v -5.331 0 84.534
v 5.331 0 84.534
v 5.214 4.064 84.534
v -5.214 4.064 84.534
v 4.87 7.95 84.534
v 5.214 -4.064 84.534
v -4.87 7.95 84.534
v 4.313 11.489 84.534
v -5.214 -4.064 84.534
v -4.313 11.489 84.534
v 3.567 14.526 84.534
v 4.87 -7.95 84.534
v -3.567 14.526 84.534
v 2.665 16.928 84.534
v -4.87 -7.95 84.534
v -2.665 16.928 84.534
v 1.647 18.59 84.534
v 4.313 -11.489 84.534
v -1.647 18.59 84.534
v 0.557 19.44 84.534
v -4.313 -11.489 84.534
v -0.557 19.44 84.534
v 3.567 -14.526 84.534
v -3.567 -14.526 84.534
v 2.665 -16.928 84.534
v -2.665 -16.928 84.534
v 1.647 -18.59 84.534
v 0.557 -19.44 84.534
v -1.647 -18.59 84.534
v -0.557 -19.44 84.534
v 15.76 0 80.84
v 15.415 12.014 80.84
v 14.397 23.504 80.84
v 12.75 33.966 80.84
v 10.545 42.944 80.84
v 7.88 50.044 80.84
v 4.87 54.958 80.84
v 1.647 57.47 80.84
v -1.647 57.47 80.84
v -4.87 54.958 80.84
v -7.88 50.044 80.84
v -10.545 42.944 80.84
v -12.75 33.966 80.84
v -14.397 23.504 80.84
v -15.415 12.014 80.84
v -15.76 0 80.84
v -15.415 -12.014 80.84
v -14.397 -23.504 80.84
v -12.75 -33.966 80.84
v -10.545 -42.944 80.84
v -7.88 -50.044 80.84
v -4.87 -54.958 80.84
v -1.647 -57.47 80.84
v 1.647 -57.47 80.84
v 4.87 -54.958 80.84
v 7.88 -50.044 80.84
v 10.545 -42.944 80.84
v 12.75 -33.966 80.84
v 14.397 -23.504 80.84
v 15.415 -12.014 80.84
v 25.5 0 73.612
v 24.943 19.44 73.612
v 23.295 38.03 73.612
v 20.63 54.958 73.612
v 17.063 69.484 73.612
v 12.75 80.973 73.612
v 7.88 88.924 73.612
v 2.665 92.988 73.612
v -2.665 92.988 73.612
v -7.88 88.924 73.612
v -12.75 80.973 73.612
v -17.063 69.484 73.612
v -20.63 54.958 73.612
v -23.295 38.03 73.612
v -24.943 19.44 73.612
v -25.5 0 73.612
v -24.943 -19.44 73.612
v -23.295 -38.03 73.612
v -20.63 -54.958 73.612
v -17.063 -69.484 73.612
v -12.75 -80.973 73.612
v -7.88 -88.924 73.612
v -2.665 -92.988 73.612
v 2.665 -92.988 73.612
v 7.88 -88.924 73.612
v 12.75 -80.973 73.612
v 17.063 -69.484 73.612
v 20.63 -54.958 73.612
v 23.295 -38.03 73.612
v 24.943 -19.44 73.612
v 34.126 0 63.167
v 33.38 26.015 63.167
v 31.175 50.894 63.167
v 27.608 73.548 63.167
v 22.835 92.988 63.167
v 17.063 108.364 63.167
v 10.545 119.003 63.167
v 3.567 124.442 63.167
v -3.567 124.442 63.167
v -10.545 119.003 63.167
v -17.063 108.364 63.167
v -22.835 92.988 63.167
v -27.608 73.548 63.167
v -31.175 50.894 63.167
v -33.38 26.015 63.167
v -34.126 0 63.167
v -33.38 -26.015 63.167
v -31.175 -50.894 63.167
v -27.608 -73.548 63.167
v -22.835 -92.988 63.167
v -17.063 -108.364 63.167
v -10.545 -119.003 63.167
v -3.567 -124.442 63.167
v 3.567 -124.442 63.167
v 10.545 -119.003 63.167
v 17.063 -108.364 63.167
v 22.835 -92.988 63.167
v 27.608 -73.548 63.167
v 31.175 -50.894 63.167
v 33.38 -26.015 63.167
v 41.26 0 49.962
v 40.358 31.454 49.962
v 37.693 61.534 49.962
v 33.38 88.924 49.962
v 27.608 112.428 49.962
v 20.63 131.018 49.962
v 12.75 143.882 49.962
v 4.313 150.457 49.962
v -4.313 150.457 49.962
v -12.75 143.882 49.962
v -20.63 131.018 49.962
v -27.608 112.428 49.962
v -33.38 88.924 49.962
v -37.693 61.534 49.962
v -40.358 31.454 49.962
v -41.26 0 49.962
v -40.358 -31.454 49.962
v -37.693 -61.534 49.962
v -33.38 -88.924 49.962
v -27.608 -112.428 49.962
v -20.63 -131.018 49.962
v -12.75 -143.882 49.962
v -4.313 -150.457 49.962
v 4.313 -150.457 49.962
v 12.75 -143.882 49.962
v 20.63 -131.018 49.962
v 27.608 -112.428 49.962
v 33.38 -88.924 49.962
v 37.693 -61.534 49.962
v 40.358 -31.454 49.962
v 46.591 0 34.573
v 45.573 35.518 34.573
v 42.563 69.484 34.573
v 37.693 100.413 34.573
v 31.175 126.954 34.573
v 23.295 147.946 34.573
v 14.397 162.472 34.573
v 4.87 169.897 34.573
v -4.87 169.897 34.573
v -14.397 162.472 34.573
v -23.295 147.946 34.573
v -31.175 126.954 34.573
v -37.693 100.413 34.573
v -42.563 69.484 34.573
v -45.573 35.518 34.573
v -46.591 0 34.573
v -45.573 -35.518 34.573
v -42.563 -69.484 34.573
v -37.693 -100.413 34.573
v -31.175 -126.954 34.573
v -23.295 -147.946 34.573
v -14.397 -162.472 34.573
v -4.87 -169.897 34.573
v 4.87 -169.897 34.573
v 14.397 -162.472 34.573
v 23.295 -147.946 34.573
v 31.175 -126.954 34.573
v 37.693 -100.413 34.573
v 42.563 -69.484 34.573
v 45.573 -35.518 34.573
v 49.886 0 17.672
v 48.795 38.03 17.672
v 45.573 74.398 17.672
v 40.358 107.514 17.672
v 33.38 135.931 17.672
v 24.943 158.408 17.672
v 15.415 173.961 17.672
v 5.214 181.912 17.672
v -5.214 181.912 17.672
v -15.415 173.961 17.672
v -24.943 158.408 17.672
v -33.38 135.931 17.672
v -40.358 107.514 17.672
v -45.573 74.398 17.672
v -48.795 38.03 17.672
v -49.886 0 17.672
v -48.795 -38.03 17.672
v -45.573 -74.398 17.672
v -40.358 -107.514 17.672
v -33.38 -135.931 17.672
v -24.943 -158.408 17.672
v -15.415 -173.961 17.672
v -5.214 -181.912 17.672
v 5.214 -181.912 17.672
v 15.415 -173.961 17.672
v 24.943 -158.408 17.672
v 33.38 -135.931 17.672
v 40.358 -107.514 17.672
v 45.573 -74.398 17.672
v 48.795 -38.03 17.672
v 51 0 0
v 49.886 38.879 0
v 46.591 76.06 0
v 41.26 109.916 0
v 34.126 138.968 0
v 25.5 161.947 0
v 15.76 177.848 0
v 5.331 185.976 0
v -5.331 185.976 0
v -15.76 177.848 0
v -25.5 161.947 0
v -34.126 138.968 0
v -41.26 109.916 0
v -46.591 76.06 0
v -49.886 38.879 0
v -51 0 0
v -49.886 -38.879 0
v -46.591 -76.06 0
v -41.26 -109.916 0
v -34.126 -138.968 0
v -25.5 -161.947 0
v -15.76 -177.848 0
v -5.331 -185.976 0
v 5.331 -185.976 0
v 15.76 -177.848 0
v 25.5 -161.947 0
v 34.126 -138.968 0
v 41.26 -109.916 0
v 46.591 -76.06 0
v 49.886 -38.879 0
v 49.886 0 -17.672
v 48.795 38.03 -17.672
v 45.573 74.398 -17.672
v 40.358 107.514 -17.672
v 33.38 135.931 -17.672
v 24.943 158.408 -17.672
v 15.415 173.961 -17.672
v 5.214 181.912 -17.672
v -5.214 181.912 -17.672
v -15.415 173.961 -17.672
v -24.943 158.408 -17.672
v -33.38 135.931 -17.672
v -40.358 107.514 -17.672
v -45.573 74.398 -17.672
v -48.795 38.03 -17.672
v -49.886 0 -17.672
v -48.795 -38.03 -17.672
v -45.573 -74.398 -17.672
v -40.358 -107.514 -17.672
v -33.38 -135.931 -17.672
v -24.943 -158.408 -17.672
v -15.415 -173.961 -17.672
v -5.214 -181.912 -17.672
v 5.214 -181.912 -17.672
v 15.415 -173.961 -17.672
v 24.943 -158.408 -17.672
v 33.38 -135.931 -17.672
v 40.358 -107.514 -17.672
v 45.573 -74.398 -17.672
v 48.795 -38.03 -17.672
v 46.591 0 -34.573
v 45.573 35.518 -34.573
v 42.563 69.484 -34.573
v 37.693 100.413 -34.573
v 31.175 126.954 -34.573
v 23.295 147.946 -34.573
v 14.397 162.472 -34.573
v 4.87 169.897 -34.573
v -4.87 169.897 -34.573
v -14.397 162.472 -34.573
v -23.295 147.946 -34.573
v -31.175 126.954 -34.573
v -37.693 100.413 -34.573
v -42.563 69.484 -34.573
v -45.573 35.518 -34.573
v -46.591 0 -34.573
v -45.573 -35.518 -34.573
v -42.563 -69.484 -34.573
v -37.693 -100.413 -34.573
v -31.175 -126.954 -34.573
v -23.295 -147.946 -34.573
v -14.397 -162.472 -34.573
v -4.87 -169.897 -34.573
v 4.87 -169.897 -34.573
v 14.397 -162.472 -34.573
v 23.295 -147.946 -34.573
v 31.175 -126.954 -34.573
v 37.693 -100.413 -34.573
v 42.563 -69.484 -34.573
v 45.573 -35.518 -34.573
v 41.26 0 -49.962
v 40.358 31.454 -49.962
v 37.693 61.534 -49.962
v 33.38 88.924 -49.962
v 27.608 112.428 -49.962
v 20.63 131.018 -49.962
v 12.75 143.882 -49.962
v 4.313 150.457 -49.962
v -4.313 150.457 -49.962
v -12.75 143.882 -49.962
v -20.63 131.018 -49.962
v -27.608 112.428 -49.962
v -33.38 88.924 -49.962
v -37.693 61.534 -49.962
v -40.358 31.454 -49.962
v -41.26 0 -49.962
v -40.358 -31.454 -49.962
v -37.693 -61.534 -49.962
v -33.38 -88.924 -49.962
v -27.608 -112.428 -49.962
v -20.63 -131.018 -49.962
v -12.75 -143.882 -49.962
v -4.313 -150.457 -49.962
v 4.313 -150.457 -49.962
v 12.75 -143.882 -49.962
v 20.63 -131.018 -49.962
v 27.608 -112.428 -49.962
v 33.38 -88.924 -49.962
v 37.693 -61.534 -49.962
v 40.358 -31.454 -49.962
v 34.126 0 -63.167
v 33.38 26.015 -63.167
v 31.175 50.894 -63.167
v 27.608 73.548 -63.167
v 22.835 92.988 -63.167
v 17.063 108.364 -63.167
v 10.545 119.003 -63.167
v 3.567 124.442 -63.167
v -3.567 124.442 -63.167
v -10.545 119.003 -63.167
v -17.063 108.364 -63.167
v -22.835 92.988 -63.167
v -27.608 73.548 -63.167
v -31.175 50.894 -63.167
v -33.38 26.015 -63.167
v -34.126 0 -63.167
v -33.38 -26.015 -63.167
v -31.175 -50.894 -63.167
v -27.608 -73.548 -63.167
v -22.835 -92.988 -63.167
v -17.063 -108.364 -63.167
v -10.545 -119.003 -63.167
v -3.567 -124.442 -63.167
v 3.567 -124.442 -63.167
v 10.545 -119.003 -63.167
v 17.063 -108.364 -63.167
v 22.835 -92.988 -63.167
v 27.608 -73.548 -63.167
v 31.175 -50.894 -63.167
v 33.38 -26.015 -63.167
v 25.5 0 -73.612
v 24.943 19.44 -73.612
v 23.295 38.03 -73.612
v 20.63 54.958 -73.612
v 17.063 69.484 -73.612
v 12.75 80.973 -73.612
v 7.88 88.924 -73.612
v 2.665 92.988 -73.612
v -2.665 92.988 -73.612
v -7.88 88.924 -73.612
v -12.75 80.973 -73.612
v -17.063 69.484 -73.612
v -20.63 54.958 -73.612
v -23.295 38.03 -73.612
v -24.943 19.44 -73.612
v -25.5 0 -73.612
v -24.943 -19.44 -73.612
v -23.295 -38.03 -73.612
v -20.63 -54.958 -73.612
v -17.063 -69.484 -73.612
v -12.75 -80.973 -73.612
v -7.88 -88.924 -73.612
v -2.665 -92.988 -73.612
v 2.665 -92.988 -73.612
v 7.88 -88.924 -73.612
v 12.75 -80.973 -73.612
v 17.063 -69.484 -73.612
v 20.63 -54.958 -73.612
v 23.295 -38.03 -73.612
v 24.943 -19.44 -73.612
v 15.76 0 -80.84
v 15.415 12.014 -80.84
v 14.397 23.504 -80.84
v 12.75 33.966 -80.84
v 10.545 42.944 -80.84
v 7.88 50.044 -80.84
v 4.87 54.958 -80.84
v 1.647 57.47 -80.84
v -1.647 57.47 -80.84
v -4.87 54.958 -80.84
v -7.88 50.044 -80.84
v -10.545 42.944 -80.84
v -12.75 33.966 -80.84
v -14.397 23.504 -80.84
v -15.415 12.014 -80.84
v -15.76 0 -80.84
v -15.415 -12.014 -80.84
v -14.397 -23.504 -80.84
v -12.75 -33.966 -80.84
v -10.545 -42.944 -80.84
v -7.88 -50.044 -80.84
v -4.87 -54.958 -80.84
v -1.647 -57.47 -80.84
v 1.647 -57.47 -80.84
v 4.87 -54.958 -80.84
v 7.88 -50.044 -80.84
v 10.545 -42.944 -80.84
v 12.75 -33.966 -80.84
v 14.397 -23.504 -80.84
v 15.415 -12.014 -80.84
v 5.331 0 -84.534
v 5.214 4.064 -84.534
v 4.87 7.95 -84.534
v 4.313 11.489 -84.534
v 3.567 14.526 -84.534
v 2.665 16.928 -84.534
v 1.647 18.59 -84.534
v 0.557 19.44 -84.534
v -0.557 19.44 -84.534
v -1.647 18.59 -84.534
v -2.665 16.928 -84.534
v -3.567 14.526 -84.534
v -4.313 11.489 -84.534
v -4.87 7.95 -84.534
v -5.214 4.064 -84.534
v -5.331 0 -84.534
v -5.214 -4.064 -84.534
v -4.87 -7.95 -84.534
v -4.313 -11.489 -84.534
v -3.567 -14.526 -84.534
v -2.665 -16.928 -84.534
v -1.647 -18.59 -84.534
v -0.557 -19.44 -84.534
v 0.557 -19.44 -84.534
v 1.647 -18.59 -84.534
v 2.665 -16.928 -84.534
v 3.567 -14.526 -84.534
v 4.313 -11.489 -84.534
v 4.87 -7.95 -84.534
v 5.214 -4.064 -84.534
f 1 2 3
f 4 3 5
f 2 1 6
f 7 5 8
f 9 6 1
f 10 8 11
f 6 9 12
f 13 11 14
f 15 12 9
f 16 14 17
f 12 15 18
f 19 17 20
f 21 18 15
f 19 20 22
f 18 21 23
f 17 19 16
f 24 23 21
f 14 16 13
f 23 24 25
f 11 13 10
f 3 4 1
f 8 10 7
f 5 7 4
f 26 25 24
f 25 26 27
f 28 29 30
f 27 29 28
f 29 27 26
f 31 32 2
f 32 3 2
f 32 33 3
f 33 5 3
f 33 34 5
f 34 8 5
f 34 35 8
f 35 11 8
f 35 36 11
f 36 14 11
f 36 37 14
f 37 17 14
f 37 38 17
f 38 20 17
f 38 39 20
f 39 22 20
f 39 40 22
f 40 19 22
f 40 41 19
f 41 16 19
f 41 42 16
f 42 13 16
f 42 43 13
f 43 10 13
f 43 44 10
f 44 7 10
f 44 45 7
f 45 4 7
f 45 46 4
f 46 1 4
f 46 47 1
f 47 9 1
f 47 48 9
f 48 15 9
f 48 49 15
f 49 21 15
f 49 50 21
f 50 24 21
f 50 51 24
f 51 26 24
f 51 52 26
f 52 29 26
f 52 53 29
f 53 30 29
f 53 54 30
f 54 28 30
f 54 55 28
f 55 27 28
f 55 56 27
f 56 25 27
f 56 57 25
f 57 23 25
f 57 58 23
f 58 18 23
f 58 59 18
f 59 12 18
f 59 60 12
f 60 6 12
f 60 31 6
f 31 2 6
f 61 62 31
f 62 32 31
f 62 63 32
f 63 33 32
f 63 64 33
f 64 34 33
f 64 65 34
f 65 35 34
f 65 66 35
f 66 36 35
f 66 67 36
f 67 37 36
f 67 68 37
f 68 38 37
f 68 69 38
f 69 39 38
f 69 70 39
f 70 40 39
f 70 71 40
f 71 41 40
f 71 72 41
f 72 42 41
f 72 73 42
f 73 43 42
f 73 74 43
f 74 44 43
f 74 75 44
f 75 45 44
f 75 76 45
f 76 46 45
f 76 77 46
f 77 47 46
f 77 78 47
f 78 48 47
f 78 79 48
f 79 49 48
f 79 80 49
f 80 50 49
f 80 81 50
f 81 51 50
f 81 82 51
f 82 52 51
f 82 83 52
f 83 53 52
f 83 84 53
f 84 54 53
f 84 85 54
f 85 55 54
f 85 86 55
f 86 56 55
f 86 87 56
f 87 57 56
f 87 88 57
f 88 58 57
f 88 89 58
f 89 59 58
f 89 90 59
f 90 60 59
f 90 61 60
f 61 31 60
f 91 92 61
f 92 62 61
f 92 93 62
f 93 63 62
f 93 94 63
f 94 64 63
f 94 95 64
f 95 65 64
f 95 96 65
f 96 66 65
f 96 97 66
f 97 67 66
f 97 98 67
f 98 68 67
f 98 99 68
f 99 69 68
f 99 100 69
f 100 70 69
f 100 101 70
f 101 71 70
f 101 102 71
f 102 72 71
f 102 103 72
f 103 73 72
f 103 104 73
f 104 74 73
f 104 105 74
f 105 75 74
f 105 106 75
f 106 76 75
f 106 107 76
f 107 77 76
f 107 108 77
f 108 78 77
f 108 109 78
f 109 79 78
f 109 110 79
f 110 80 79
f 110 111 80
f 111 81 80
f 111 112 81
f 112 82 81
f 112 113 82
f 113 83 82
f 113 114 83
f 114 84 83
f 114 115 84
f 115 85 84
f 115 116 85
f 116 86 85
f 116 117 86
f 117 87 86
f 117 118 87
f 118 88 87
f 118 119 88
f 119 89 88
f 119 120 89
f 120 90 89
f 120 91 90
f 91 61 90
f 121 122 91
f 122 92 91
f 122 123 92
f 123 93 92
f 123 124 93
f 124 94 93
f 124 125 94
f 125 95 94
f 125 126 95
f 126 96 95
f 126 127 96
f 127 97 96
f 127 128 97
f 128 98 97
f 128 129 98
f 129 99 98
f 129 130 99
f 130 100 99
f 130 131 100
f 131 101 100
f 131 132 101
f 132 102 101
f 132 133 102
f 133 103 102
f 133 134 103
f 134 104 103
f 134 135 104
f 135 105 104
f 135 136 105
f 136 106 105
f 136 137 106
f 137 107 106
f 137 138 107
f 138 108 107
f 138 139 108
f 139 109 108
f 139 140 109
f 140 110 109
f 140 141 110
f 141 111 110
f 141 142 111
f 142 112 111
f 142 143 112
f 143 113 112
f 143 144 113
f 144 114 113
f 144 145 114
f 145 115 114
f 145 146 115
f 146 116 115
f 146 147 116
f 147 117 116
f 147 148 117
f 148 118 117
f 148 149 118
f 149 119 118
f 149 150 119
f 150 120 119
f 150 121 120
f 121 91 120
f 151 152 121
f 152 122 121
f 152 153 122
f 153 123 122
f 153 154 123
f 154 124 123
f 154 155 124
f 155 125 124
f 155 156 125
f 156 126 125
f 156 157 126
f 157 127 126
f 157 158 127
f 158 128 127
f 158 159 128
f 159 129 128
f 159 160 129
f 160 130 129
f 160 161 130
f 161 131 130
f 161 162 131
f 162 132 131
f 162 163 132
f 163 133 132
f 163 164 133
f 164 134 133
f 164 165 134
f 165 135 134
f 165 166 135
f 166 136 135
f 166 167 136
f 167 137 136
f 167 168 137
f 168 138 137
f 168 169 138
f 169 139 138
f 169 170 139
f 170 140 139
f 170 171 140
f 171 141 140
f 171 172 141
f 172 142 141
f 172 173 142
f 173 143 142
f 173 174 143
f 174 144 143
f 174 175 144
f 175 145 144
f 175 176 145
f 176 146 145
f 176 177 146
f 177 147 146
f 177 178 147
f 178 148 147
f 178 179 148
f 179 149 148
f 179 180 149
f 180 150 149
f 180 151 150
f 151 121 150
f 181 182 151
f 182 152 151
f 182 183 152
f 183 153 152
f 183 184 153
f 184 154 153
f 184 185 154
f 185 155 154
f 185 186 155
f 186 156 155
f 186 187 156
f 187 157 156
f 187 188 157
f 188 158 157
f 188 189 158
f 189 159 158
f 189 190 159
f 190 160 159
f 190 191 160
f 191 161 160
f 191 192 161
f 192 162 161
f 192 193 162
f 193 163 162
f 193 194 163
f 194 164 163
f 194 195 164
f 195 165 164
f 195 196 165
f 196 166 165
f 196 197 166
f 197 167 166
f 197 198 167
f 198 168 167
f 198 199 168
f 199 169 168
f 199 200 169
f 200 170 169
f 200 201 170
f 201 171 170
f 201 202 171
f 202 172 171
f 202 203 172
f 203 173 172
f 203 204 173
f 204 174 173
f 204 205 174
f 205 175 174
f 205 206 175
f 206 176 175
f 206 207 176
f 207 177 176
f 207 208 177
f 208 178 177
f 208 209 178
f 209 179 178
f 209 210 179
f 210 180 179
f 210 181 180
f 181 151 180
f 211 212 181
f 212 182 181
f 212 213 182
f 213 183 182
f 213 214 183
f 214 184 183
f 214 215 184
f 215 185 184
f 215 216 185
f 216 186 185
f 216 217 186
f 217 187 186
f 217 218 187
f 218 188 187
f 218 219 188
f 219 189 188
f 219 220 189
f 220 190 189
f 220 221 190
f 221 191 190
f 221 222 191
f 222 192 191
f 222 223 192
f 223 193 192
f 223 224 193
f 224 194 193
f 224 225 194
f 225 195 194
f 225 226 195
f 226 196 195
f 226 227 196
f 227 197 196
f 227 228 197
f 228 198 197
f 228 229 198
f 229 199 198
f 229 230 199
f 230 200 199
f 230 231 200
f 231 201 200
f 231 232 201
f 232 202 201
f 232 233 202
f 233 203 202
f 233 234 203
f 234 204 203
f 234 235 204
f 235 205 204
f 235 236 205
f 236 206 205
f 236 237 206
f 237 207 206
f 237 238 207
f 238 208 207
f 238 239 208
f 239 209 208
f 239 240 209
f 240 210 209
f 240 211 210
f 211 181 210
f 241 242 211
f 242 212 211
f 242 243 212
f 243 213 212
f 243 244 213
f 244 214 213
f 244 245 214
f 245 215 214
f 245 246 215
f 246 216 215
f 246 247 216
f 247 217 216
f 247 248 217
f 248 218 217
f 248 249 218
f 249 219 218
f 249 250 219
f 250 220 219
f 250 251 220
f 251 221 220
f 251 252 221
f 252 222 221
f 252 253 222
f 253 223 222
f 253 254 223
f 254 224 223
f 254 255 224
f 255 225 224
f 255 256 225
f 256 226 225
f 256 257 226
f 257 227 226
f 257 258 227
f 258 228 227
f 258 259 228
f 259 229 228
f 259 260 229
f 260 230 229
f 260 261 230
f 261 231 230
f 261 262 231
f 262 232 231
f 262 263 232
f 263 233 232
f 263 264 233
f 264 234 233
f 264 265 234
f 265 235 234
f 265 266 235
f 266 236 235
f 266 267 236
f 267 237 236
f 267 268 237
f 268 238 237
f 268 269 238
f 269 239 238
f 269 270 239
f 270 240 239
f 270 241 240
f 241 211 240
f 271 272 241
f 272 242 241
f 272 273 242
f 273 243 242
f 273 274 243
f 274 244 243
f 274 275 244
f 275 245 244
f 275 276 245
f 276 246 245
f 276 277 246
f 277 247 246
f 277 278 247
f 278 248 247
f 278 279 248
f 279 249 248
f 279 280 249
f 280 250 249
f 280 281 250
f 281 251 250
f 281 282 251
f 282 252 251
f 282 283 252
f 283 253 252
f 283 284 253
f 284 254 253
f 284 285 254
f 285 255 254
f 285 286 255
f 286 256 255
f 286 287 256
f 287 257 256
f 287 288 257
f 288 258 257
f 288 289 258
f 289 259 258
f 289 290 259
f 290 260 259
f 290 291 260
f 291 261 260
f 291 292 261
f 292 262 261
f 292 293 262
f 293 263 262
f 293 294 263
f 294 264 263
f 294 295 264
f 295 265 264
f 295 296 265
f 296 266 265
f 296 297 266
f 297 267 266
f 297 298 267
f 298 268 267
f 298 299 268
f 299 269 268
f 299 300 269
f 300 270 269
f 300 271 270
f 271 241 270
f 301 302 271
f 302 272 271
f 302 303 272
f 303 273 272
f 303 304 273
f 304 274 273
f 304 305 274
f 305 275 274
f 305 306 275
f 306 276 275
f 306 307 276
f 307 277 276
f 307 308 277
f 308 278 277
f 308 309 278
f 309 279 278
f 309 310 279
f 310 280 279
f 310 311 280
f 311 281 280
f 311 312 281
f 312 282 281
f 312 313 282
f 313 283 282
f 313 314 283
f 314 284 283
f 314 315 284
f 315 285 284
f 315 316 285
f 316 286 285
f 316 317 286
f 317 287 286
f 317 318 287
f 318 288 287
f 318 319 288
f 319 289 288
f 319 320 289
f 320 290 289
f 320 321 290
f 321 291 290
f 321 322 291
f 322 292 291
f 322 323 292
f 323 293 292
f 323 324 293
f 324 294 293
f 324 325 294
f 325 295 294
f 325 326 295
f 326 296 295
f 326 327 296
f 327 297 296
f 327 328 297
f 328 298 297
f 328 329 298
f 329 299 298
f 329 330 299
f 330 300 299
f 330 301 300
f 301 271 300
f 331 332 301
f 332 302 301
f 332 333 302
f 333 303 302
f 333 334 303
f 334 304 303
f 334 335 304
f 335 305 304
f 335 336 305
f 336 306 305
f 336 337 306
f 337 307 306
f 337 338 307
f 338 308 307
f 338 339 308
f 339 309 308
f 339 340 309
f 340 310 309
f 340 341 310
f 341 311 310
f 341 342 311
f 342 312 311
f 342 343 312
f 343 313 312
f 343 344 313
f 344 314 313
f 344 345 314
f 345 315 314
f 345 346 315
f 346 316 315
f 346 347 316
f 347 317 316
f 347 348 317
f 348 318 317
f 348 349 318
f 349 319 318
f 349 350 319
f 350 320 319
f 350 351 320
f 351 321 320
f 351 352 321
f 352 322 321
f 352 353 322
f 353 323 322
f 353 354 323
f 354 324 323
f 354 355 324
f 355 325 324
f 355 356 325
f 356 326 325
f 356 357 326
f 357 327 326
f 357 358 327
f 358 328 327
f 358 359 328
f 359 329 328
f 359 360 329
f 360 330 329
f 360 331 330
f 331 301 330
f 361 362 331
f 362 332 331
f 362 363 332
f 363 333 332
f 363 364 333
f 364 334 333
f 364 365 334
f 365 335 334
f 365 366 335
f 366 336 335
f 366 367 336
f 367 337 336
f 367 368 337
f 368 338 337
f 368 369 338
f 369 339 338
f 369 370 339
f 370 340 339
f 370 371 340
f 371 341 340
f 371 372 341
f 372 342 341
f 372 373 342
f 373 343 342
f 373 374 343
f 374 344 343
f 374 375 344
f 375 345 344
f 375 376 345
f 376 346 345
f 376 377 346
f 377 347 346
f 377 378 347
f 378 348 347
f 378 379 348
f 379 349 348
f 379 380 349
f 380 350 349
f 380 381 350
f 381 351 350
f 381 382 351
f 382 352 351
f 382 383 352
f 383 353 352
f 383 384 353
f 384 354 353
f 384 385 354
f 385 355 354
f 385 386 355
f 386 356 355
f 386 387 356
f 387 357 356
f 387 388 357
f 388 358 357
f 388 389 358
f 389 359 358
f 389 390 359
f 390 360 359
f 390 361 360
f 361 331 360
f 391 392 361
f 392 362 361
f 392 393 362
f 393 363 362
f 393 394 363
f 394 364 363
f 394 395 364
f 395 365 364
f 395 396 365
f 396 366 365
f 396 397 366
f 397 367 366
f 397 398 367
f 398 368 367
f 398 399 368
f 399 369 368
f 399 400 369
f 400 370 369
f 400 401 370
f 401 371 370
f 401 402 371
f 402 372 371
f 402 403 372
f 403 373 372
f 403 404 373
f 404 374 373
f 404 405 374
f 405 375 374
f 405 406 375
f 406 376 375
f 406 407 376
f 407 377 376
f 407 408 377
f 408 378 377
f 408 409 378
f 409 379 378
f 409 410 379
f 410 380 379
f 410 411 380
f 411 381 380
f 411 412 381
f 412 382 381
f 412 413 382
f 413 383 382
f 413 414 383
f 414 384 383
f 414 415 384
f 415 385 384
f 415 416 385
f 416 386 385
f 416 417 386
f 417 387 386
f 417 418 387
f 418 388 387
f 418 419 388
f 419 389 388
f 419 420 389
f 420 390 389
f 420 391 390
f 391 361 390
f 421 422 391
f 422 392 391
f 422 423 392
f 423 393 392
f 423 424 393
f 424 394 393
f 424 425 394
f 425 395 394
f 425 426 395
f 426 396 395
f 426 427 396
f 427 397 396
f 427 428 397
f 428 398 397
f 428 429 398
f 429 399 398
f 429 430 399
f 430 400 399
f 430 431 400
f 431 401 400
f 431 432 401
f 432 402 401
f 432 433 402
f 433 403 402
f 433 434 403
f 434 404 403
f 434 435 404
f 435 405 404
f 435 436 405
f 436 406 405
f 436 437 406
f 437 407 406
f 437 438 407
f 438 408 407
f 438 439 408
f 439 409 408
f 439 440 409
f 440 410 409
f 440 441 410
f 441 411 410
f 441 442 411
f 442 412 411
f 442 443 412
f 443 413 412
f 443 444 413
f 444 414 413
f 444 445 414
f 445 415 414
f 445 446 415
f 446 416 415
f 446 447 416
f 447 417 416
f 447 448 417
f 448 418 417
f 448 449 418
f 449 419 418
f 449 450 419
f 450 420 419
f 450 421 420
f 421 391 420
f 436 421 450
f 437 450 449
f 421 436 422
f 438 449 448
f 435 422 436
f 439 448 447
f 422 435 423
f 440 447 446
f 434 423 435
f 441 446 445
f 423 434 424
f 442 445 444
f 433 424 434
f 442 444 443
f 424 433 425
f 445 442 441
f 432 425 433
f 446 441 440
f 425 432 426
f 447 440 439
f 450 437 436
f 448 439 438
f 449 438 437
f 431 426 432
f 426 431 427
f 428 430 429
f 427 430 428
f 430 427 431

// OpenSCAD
// Generated by SolidPython 1.0.1 on 2020-07-29 00:46:45


scale(v = [3, 11, 5]) {
	sphere(r = 17);
}
/***********************************************
*********      SolidPython code:      **********
************************************************
 
# import packages: SolidPython
from solid import *
from solid.utils import *
from itertools import chain, combinations, permutations


class Resize:

    def __init__(self, scad_file):
        self.scad_file = scad_file
        #self.scad_file = import_scad(scad_file)
        # cone/cylinder param:
        self.r1 = 0
        self.r2 = 0
        self.h = 0
        # rectangular prism param:
        self.w = 0
        self.l = 0
        # ellipse param:
        self.r = 0

    # import OpenScad code (file name corresponds to shape)


    # classify shape + parameters
    def assign(self, param1, param2, param3):
        if self.scad_file == 'cone.scad':
            self.r1 = param1
            self.r2 = param2
            self.h = param3
        elif self.scad_file == 'cylinder.scad':
            self.r1 = param1
            self.r2 = param2
            self.h = param3
        elif self.scad_file == 'rectangularPrism.scad':
            self.h = param1
            self.l = param2
            self.w = param3
        else:
            self.r = param1
            self.h = param2

    # resize parameters
    def iterate(self):
        x = range(3, 20, 2)
        i = 1
        if self.scad_file == 'cone.scad':
            tempList = list(permutations(x, 2))
            for temp in tempList:
                param1 = temp[0]
                param2 = temp[1]
                filepath = 'produced_scad_files/' + 'cone' + str(param1) + '_' + str(param2) + '_' + '.scad'
                scad_render_to_file(cylinder(h=param1, r1=param2, r2=0), filepath)

        elif self.scad_file == 'cylinder.scad':
            tempList = list(permutations(x, 3))
            for temp in tempList:
                param1 = temp[0]
                param2 = temp[1]
                filepath = 'produced_scad_files/' + 'cylinder' + str(param1) + '_' + str(param2) + '_' + '.scad'
                scad_render_to_file(cylinder(h=param1, r1=param2, r2=param2), filepath)

        elif self.scad_file == 'rectangularPrism.scad':
            tempList = list(permutations(x, 3))
            for temp in tempList:
                param1 = temp[0]
                param2 = temp[1]
                param3 = temp[2]
                filepath = 'produced_scad_files/' + 'rectangularPrism' + str(param1) + '_' + str(param2) + '_' + str(
                    param3) + '.scad'
                scad_render_to_file(cube(size=(param1, param2, param3)), filepath)

        elif self.scad_file == 'ellipse.scad':
            tempList = list(permutations(x, 4))
            for temp in tempList:
                param1 = temp[0]
                param2 = temp[1]
                param3 = temp[2]
                param4 = temp[3]
                filepath = 'produced_scad_files/' + 'ellipse' + str(param1) + '_' + str(param2) + '_' + str(param3) + '_' + str(param4) + '.scad'
                scad_render_to_file(scale([param1, param2, param3])(sphere(r=param4)), filepath)

    def render_to_scadfile(self):
        scad_render_to_file(scad, 'example.scad') 
 
************************************************/
